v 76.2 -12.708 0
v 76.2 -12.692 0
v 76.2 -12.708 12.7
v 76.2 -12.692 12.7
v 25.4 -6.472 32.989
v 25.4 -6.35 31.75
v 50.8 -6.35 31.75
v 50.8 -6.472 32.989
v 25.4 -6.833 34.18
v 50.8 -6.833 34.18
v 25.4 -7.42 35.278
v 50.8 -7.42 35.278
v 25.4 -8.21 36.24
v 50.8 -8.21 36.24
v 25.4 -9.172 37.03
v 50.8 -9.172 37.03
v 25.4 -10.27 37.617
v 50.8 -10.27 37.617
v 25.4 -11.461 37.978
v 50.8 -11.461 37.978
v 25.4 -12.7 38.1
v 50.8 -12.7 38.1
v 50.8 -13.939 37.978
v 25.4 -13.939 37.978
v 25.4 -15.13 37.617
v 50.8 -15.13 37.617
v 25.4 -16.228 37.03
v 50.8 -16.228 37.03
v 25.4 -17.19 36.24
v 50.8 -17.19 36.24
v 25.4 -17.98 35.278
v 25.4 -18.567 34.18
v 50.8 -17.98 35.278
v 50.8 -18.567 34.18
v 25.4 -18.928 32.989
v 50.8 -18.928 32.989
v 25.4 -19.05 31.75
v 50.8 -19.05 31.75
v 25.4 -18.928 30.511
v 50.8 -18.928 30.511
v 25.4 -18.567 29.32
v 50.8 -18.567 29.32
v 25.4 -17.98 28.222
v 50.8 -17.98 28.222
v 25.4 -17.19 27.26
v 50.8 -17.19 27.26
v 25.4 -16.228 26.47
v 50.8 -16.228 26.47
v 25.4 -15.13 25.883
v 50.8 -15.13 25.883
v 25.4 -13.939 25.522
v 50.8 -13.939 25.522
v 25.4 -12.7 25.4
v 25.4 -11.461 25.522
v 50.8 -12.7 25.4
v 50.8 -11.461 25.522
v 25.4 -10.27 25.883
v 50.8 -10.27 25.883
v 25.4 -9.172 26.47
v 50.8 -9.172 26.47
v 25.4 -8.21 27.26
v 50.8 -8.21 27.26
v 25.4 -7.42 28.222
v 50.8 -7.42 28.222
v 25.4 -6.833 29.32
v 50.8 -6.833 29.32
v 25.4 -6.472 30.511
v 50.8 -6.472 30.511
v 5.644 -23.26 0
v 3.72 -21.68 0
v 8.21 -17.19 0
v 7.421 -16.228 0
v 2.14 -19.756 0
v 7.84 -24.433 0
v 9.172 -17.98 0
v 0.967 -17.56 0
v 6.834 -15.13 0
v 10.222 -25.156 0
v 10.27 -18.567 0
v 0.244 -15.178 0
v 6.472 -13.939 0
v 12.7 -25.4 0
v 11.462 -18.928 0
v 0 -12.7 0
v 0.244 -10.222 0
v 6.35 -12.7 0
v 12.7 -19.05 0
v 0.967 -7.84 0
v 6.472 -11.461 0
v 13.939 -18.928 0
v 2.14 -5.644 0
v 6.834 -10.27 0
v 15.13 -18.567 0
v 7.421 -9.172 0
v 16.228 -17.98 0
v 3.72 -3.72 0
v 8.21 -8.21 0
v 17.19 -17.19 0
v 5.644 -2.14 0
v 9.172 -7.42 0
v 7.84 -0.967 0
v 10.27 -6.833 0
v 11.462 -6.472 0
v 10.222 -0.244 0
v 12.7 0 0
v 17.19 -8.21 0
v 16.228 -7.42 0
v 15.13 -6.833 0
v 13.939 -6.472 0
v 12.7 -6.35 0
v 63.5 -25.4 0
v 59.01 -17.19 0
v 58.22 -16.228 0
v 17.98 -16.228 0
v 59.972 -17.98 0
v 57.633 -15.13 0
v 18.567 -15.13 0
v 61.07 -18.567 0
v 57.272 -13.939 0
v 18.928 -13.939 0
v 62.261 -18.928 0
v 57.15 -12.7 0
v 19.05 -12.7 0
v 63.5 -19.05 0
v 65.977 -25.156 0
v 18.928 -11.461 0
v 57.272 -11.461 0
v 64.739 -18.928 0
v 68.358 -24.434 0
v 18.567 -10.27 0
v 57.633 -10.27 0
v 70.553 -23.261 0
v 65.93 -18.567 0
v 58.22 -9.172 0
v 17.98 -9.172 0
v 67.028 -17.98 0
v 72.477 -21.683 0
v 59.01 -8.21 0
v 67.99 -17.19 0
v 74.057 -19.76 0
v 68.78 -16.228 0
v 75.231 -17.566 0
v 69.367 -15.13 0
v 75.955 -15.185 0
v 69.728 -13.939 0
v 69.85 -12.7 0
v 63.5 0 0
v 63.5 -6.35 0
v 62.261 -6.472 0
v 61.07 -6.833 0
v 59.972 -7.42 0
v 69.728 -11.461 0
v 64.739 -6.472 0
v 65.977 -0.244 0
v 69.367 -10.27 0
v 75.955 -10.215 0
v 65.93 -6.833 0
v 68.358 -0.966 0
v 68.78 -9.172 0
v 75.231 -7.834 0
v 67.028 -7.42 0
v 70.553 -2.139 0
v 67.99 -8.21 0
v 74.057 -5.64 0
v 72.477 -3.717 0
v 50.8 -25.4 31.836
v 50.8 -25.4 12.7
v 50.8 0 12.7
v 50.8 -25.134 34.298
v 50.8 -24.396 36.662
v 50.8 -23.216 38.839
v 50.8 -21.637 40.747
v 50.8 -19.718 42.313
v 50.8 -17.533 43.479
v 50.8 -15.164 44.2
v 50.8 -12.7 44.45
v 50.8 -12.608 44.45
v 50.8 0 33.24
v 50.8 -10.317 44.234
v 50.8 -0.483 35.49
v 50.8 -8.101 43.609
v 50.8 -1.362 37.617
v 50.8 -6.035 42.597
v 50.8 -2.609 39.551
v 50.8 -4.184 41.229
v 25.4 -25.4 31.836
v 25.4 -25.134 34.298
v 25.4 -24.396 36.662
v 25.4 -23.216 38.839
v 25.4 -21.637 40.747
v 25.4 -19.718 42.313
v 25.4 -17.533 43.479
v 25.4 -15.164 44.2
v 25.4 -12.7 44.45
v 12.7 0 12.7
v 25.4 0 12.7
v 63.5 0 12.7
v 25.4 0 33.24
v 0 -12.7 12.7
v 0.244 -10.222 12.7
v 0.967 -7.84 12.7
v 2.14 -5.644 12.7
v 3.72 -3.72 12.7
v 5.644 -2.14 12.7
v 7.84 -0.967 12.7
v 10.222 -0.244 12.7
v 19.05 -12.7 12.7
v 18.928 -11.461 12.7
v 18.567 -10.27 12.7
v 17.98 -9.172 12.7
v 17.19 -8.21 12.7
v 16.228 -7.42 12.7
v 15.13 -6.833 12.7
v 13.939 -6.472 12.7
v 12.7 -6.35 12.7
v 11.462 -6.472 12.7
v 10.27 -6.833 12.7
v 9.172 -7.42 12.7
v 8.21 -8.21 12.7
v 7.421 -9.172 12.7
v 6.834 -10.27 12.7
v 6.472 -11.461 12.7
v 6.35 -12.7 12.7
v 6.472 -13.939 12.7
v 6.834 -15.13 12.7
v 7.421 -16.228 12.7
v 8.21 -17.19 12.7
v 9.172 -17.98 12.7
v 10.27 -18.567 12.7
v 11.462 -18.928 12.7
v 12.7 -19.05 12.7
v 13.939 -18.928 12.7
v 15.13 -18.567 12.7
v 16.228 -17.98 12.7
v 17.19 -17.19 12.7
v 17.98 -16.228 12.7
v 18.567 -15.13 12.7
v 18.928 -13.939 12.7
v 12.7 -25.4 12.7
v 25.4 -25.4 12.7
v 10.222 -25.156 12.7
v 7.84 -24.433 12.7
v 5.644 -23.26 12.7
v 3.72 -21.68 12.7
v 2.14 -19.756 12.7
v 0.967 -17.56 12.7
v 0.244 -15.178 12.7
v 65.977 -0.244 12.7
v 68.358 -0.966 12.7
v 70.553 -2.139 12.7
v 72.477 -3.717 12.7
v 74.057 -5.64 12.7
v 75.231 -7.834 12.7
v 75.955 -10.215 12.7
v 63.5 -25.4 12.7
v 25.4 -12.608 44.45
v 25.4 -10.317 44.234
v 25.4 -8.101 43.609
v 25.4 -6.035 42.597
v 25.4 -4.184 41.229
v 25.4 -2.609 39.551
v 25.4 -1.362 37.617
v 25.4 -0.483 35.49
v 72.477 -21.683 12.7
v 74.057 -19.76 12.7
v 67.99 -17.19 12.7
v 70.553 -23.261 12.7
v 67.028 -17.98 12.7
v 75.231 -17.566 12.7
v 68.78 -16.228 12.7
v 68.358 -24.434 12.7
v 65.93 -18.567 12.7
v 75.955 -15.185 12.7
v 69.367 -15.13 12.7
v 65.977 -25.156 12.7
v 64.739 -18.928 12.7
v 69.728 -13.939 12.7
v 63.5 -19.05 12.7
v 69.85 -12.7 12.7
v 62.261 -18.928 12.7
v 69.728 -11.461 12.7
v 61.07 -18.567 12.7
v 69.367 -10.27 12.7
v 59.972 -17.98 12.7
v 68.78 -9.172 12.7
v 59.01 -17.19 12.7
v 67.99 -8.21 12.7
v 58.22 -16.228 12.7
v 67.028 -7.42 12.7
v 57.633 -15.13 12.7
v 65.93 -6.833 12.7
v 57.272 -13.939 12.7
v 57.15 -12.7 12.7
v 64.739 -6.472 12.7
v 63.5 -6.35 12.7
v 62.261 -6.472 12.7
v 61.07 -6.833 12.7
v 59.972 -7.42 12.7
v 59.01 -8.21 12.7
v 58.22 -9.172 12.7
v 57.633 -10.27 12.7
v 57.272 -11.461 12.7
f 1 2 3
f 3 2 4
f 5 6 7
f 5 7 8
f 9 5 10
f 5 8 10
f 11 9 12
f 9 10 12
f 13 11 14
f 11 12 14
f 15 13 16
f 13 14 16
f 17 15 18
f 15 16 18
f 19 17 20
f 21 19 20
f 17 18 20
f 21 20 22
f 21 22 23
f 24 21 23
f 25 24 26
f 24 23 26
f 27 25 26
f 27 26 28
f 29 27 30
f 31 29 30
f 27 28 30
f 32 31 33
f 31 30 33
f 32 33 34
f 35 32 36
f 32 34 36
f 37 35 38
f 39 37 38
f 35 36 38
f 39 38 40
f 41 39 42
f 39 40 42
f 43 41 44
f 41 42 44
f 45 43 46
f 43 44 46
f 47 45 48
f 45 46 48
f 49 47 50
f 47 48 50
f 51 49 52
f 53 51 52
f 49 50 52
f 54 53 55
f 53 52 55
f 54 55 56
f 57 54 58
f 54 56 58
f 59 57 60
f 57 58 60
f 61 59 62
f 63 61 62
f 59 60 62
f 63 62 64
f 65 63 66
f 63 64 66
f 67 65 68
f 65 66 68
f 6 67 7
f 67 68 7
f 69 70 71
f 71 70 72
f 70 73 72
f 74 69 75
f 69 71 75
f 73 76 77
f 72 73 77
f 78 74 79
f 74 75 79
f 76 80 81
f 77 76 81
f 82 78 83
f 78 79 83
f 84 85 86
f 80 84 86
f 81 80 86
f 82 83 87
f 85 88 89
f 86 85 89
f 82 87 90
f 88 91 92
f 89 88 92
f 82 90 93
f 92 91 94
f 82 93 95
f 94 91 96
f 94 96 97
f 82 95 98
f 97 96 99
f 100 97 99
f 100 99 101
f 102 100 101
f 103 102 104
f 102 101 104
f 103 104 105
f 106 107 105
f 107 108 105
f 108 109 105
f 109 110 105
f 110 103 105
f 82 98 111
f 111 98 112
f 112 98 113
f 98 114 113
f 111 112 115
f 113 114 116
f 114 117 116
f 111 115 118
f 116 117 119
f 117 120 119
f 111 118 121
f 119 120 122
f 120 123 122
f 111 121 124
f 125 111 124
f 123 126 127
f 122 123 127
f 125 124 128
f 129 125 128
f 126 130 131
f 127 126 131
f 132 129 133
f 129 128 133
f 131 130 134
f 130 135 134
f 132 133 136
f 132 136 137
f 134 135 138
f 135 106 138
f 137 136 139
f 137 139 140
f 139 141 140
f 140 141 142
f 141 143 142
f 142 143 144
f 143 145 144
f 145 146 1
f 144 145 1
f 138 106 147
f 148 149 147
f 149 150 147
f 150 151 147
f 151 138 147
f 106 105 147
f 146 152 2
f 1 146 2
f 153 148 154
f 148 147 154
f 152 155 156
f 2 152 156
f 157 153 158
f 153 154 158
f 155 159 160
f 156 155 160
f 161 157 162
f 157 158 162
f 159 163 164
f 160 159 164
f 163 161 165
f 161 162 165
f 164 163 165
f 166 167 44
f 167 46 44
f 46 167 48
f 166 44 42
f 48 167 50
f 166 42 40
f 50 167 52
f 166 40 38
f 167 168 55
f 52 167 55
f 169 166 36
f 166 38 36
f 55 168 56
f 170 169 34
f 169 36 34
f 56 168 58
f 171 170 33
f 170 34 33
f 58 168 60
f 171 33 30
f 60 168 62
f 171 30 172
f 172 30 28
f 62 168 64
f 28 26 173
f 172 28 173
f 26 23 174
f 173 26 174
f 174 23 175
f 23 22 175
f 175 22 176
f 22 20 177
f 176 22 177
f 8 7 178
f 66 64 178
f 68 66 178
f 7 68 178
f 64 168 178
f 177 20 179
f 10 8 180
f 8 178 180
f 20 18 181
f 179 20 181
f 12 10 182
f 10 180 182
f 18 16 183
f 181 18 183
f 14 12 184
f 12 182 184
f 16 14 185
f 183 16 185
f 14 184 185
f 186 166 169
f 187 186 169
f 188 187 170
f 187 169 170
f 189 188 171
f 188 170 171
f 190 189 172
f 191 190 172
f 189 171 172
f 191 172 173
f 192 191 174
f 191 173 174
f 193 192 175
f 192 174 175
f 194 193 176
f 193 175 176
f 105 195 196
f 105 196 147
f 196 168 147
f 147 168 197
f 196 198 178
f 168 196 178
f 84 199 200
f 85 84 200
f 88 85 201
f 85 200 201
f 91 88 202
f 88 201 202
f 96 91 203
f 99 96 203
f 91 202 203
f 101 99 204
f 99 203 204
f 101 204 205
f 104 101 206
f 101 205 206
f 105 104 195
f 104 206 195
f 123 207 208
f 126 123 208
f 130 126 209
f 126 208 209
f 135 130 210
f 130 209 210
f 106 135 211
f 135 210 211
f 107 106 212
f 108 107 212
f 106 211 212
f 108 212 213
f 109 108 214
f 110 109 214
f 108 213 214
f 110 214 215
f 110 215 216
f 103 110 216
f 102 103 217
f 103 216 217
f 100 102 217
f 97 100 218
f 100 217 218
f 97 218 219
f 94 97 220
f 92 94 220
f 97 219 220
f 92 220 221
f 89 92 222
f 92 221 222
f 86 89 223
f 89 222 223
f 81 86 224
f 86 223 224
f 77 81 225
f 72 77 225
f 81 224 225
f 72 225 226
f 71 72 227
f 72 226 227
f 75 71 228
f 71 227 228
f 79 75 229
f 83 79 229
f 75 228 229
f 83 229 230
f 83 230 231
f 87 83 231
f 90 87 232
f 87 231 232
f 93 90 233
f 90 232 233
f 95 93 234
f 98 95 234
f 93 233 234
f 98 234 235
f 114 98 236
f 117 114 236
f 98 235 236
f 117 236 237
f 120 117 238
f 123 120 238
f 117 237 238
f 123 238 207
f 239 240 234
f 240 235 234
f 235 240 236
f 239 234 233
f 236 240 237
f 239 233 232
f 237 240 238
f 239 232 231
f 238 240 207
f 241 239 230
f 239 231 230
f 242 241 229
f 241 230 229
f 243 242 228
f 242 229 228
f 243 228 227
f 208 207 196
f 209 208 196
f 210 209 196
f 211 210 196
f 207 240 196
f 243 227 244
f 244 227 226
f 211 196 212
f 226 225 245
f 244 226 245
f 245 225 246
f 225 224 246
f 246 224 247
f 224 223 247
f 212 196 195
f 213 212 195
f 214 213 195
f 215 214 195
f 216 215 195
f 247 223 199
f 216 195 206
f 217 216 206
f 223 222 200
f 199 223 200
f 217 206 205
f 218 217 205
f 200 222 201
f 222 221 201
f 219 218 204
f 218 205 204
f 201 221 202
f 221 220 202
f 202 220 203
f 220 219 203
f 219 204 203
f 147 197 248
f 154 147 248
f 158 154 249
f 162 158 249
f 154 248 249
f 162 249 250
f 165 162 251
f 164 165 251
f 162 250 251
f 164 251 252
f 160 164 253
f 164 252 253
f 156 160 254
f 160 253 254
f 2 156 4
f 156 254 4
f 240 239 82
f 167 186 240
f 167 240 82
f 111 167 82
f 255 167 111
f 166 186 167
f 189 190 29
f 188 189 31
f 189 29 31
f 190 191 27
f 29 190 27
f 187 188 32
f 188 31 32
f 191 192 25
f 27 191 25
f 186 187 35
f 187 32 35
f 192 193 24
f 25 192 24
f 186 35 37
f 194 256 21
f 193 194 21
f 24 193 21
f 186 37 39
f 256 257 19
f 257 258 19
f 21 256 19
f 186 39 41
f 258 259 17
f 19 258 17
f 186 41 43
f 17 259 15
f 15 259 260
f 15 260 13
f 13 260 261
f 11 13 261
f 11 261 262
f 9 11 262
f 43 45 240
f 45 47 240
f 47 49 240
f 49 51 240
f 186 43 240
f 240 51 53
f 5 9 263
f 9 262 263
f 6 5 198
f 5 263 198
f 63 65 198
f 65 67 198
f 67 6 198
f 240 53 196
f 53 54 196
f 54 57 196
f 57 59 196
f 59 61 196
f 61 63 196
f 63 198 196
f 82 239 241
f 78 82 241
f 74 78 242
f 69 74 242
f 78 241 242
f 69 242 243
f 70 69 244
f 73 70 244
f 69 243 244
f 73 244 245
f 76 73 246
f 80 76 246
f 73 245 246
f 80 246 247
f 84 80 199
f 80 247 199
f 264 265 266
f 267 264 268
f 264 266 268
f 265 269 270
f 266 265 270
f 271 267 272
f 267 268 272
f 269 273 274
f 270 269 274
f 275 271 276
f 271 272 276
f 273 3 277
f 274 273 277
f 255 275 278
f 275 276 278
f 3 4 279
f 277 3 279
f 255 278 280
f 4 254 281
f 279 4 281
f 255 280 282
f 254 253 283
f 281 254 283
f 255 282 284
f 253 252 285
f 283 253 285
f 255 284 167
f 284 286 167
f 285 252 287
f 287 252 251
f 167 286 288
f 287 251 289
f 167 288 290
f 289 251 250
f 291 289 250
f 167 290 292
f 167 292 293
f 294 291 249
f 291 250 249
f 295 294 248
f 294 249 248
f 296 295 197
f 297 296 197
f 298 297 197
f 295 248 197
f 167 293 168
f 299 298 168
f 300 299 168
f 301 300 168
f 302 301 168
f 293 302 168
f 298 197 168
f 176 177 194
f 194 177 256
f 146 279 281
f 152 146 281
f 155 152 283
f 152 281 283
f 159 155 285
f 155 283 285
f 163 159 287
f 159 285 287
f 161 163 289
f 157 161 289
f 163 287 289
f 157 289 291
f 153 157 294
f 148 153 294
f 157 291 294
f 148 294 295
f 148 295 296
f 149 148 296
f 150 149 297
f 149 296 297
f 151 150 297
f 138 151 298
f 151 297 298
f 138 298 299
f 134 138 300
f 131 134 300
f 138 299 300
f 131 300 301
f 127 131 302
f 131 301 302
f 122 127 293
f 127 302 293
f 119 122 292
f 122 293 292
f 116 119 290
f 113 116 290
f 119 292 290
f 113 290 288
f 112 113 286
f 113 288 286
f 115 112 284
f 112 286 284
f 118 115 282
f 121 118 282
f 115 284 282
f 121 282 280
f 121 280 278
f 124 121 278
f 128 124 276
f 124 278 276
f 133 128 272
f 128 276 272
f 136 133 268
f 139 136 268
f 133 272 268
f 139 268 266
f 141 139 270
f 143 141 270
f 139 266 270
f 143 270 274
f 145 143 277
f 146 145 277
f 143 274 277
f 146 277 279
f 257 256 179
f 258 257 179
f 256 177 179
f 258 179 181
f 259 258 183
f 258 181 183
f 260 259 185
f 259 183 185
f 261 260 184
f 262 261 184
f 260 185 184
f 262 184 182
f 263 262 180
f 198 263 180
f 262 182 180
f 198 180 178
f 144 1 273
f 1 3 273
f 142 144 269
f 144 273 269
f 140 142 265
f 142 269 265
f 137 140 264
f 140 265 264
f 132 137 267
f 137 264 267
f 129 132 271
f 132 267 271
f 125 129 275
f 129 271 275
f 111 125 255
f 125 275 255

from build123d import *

# Parameters (mm, degrees)
F1_DEPTH = 25.4
F2_R     = 6.35
F3_DEPTH = 25.4
F4_R     = 6.35
F5_DEPTH = 12.7
F7_DEPTH = 12.7


# Not quite as in the source:
# - ends of sketch curves that miss each other by under 0.0002 mm in the source are joined


with BuildPart() as f1:
    # F0 (on Front) → F1 (new body)
    with BuildSketch(Plane.XZ):
        Polygon((0, 12.7), (0, 0), (76.2, 0), (76.2, 12.7), (50.8, 12.7), (50.8, 44.45), (25.4, 44.45), (25.4, 12.7), align=None)
    extrude(amount=F1_DEPTH)

    # F2 (on face) → F3 (cut)
    with BuildSketch(Plane.YZ.offset(50.8)):
        with Locations((-12.7, 31.75)):
            Circle(F2_R)
        with BuildLine():
            ThreePointArc((-12.6538738539, 44.4500834572), (-4.2011824857, 41.2444061447), (0, 33.2397559887))
            Line((0, 33.2397559887), (0, 44.45))
            Line((0, 44.45), (-12.6538738539, 44.4500834572))
        make_face()
        with BuildLine():
            ThreePointArc((-25.4, 31.8358913064), (-21.6202217079, 40.7633957722), (-12.6538738539, 44.4500834572))
            Line((-12.6538738539, 44.4500834572), (-25.4, 44.45))
            Line((-25.4, 44.45), (-25.4, 31.8358913064))
        make_face()
    extrude(amount=-F3_DEPTH, mode=Mode.SUBTRACT)

    # F4 (on face) → F5 (cut)
    with BuildSketch(Plane.XY.offset(12.7)):
        with Locations((12.7003350629, -12.6999999956)):
            Circle(F4_R)
        with BuildLine():
            ThreePointArc((0, -12.7), (3.7197438789, -3.7197438789), (12.7, 0))
            Line((12.7, 0), (0, 0))
            Line((0, 0), (0, -12.7))
        make_face()
        with Locations((63.5, -12.7)):
            Circle(F4_R)
        with BuildLine():
            Line((0, -25.4), (12.7, -25.4))
            ThreePointArc((12.7, -25.4), (3.7197438789, -21.6802561211), (0, -12.7))
            Line((0, -12.7), (0, -25.4))
        make_face()
    extrude(amount=-F5_DEPTH, mode=Mode.SUBTRACT)

    # F6 (on face) → F7 (cut)
    with BuildSketch(Plane.XY.offset(12.7)):
        with BuildLine():
            ThreePointArc((76.2000025586, -12.7), (72.4802576974, -21.6802565734), (63.5, -25.3999987207))
            Line((63.5, -25.3999987207), (76.2, -25.4))
            Line((76.2, -25.4), (76.2000025586, -12.7))
        make_face()
        with BuildLine():
            ThreePointArc((63.5, -1.2793e-06), (72.4802576975, -3.7197434266), (76.2000025586, -12.7))
            Line((76.2000025586, -12.7), (76.2, 0))
            Line((76.2, 0), (63.5, -1.2793e-06))
        make_face()
    extrude(amount=-F7_DEPTH, mode=Mode.SUBTRACT)


solid = f1.part
